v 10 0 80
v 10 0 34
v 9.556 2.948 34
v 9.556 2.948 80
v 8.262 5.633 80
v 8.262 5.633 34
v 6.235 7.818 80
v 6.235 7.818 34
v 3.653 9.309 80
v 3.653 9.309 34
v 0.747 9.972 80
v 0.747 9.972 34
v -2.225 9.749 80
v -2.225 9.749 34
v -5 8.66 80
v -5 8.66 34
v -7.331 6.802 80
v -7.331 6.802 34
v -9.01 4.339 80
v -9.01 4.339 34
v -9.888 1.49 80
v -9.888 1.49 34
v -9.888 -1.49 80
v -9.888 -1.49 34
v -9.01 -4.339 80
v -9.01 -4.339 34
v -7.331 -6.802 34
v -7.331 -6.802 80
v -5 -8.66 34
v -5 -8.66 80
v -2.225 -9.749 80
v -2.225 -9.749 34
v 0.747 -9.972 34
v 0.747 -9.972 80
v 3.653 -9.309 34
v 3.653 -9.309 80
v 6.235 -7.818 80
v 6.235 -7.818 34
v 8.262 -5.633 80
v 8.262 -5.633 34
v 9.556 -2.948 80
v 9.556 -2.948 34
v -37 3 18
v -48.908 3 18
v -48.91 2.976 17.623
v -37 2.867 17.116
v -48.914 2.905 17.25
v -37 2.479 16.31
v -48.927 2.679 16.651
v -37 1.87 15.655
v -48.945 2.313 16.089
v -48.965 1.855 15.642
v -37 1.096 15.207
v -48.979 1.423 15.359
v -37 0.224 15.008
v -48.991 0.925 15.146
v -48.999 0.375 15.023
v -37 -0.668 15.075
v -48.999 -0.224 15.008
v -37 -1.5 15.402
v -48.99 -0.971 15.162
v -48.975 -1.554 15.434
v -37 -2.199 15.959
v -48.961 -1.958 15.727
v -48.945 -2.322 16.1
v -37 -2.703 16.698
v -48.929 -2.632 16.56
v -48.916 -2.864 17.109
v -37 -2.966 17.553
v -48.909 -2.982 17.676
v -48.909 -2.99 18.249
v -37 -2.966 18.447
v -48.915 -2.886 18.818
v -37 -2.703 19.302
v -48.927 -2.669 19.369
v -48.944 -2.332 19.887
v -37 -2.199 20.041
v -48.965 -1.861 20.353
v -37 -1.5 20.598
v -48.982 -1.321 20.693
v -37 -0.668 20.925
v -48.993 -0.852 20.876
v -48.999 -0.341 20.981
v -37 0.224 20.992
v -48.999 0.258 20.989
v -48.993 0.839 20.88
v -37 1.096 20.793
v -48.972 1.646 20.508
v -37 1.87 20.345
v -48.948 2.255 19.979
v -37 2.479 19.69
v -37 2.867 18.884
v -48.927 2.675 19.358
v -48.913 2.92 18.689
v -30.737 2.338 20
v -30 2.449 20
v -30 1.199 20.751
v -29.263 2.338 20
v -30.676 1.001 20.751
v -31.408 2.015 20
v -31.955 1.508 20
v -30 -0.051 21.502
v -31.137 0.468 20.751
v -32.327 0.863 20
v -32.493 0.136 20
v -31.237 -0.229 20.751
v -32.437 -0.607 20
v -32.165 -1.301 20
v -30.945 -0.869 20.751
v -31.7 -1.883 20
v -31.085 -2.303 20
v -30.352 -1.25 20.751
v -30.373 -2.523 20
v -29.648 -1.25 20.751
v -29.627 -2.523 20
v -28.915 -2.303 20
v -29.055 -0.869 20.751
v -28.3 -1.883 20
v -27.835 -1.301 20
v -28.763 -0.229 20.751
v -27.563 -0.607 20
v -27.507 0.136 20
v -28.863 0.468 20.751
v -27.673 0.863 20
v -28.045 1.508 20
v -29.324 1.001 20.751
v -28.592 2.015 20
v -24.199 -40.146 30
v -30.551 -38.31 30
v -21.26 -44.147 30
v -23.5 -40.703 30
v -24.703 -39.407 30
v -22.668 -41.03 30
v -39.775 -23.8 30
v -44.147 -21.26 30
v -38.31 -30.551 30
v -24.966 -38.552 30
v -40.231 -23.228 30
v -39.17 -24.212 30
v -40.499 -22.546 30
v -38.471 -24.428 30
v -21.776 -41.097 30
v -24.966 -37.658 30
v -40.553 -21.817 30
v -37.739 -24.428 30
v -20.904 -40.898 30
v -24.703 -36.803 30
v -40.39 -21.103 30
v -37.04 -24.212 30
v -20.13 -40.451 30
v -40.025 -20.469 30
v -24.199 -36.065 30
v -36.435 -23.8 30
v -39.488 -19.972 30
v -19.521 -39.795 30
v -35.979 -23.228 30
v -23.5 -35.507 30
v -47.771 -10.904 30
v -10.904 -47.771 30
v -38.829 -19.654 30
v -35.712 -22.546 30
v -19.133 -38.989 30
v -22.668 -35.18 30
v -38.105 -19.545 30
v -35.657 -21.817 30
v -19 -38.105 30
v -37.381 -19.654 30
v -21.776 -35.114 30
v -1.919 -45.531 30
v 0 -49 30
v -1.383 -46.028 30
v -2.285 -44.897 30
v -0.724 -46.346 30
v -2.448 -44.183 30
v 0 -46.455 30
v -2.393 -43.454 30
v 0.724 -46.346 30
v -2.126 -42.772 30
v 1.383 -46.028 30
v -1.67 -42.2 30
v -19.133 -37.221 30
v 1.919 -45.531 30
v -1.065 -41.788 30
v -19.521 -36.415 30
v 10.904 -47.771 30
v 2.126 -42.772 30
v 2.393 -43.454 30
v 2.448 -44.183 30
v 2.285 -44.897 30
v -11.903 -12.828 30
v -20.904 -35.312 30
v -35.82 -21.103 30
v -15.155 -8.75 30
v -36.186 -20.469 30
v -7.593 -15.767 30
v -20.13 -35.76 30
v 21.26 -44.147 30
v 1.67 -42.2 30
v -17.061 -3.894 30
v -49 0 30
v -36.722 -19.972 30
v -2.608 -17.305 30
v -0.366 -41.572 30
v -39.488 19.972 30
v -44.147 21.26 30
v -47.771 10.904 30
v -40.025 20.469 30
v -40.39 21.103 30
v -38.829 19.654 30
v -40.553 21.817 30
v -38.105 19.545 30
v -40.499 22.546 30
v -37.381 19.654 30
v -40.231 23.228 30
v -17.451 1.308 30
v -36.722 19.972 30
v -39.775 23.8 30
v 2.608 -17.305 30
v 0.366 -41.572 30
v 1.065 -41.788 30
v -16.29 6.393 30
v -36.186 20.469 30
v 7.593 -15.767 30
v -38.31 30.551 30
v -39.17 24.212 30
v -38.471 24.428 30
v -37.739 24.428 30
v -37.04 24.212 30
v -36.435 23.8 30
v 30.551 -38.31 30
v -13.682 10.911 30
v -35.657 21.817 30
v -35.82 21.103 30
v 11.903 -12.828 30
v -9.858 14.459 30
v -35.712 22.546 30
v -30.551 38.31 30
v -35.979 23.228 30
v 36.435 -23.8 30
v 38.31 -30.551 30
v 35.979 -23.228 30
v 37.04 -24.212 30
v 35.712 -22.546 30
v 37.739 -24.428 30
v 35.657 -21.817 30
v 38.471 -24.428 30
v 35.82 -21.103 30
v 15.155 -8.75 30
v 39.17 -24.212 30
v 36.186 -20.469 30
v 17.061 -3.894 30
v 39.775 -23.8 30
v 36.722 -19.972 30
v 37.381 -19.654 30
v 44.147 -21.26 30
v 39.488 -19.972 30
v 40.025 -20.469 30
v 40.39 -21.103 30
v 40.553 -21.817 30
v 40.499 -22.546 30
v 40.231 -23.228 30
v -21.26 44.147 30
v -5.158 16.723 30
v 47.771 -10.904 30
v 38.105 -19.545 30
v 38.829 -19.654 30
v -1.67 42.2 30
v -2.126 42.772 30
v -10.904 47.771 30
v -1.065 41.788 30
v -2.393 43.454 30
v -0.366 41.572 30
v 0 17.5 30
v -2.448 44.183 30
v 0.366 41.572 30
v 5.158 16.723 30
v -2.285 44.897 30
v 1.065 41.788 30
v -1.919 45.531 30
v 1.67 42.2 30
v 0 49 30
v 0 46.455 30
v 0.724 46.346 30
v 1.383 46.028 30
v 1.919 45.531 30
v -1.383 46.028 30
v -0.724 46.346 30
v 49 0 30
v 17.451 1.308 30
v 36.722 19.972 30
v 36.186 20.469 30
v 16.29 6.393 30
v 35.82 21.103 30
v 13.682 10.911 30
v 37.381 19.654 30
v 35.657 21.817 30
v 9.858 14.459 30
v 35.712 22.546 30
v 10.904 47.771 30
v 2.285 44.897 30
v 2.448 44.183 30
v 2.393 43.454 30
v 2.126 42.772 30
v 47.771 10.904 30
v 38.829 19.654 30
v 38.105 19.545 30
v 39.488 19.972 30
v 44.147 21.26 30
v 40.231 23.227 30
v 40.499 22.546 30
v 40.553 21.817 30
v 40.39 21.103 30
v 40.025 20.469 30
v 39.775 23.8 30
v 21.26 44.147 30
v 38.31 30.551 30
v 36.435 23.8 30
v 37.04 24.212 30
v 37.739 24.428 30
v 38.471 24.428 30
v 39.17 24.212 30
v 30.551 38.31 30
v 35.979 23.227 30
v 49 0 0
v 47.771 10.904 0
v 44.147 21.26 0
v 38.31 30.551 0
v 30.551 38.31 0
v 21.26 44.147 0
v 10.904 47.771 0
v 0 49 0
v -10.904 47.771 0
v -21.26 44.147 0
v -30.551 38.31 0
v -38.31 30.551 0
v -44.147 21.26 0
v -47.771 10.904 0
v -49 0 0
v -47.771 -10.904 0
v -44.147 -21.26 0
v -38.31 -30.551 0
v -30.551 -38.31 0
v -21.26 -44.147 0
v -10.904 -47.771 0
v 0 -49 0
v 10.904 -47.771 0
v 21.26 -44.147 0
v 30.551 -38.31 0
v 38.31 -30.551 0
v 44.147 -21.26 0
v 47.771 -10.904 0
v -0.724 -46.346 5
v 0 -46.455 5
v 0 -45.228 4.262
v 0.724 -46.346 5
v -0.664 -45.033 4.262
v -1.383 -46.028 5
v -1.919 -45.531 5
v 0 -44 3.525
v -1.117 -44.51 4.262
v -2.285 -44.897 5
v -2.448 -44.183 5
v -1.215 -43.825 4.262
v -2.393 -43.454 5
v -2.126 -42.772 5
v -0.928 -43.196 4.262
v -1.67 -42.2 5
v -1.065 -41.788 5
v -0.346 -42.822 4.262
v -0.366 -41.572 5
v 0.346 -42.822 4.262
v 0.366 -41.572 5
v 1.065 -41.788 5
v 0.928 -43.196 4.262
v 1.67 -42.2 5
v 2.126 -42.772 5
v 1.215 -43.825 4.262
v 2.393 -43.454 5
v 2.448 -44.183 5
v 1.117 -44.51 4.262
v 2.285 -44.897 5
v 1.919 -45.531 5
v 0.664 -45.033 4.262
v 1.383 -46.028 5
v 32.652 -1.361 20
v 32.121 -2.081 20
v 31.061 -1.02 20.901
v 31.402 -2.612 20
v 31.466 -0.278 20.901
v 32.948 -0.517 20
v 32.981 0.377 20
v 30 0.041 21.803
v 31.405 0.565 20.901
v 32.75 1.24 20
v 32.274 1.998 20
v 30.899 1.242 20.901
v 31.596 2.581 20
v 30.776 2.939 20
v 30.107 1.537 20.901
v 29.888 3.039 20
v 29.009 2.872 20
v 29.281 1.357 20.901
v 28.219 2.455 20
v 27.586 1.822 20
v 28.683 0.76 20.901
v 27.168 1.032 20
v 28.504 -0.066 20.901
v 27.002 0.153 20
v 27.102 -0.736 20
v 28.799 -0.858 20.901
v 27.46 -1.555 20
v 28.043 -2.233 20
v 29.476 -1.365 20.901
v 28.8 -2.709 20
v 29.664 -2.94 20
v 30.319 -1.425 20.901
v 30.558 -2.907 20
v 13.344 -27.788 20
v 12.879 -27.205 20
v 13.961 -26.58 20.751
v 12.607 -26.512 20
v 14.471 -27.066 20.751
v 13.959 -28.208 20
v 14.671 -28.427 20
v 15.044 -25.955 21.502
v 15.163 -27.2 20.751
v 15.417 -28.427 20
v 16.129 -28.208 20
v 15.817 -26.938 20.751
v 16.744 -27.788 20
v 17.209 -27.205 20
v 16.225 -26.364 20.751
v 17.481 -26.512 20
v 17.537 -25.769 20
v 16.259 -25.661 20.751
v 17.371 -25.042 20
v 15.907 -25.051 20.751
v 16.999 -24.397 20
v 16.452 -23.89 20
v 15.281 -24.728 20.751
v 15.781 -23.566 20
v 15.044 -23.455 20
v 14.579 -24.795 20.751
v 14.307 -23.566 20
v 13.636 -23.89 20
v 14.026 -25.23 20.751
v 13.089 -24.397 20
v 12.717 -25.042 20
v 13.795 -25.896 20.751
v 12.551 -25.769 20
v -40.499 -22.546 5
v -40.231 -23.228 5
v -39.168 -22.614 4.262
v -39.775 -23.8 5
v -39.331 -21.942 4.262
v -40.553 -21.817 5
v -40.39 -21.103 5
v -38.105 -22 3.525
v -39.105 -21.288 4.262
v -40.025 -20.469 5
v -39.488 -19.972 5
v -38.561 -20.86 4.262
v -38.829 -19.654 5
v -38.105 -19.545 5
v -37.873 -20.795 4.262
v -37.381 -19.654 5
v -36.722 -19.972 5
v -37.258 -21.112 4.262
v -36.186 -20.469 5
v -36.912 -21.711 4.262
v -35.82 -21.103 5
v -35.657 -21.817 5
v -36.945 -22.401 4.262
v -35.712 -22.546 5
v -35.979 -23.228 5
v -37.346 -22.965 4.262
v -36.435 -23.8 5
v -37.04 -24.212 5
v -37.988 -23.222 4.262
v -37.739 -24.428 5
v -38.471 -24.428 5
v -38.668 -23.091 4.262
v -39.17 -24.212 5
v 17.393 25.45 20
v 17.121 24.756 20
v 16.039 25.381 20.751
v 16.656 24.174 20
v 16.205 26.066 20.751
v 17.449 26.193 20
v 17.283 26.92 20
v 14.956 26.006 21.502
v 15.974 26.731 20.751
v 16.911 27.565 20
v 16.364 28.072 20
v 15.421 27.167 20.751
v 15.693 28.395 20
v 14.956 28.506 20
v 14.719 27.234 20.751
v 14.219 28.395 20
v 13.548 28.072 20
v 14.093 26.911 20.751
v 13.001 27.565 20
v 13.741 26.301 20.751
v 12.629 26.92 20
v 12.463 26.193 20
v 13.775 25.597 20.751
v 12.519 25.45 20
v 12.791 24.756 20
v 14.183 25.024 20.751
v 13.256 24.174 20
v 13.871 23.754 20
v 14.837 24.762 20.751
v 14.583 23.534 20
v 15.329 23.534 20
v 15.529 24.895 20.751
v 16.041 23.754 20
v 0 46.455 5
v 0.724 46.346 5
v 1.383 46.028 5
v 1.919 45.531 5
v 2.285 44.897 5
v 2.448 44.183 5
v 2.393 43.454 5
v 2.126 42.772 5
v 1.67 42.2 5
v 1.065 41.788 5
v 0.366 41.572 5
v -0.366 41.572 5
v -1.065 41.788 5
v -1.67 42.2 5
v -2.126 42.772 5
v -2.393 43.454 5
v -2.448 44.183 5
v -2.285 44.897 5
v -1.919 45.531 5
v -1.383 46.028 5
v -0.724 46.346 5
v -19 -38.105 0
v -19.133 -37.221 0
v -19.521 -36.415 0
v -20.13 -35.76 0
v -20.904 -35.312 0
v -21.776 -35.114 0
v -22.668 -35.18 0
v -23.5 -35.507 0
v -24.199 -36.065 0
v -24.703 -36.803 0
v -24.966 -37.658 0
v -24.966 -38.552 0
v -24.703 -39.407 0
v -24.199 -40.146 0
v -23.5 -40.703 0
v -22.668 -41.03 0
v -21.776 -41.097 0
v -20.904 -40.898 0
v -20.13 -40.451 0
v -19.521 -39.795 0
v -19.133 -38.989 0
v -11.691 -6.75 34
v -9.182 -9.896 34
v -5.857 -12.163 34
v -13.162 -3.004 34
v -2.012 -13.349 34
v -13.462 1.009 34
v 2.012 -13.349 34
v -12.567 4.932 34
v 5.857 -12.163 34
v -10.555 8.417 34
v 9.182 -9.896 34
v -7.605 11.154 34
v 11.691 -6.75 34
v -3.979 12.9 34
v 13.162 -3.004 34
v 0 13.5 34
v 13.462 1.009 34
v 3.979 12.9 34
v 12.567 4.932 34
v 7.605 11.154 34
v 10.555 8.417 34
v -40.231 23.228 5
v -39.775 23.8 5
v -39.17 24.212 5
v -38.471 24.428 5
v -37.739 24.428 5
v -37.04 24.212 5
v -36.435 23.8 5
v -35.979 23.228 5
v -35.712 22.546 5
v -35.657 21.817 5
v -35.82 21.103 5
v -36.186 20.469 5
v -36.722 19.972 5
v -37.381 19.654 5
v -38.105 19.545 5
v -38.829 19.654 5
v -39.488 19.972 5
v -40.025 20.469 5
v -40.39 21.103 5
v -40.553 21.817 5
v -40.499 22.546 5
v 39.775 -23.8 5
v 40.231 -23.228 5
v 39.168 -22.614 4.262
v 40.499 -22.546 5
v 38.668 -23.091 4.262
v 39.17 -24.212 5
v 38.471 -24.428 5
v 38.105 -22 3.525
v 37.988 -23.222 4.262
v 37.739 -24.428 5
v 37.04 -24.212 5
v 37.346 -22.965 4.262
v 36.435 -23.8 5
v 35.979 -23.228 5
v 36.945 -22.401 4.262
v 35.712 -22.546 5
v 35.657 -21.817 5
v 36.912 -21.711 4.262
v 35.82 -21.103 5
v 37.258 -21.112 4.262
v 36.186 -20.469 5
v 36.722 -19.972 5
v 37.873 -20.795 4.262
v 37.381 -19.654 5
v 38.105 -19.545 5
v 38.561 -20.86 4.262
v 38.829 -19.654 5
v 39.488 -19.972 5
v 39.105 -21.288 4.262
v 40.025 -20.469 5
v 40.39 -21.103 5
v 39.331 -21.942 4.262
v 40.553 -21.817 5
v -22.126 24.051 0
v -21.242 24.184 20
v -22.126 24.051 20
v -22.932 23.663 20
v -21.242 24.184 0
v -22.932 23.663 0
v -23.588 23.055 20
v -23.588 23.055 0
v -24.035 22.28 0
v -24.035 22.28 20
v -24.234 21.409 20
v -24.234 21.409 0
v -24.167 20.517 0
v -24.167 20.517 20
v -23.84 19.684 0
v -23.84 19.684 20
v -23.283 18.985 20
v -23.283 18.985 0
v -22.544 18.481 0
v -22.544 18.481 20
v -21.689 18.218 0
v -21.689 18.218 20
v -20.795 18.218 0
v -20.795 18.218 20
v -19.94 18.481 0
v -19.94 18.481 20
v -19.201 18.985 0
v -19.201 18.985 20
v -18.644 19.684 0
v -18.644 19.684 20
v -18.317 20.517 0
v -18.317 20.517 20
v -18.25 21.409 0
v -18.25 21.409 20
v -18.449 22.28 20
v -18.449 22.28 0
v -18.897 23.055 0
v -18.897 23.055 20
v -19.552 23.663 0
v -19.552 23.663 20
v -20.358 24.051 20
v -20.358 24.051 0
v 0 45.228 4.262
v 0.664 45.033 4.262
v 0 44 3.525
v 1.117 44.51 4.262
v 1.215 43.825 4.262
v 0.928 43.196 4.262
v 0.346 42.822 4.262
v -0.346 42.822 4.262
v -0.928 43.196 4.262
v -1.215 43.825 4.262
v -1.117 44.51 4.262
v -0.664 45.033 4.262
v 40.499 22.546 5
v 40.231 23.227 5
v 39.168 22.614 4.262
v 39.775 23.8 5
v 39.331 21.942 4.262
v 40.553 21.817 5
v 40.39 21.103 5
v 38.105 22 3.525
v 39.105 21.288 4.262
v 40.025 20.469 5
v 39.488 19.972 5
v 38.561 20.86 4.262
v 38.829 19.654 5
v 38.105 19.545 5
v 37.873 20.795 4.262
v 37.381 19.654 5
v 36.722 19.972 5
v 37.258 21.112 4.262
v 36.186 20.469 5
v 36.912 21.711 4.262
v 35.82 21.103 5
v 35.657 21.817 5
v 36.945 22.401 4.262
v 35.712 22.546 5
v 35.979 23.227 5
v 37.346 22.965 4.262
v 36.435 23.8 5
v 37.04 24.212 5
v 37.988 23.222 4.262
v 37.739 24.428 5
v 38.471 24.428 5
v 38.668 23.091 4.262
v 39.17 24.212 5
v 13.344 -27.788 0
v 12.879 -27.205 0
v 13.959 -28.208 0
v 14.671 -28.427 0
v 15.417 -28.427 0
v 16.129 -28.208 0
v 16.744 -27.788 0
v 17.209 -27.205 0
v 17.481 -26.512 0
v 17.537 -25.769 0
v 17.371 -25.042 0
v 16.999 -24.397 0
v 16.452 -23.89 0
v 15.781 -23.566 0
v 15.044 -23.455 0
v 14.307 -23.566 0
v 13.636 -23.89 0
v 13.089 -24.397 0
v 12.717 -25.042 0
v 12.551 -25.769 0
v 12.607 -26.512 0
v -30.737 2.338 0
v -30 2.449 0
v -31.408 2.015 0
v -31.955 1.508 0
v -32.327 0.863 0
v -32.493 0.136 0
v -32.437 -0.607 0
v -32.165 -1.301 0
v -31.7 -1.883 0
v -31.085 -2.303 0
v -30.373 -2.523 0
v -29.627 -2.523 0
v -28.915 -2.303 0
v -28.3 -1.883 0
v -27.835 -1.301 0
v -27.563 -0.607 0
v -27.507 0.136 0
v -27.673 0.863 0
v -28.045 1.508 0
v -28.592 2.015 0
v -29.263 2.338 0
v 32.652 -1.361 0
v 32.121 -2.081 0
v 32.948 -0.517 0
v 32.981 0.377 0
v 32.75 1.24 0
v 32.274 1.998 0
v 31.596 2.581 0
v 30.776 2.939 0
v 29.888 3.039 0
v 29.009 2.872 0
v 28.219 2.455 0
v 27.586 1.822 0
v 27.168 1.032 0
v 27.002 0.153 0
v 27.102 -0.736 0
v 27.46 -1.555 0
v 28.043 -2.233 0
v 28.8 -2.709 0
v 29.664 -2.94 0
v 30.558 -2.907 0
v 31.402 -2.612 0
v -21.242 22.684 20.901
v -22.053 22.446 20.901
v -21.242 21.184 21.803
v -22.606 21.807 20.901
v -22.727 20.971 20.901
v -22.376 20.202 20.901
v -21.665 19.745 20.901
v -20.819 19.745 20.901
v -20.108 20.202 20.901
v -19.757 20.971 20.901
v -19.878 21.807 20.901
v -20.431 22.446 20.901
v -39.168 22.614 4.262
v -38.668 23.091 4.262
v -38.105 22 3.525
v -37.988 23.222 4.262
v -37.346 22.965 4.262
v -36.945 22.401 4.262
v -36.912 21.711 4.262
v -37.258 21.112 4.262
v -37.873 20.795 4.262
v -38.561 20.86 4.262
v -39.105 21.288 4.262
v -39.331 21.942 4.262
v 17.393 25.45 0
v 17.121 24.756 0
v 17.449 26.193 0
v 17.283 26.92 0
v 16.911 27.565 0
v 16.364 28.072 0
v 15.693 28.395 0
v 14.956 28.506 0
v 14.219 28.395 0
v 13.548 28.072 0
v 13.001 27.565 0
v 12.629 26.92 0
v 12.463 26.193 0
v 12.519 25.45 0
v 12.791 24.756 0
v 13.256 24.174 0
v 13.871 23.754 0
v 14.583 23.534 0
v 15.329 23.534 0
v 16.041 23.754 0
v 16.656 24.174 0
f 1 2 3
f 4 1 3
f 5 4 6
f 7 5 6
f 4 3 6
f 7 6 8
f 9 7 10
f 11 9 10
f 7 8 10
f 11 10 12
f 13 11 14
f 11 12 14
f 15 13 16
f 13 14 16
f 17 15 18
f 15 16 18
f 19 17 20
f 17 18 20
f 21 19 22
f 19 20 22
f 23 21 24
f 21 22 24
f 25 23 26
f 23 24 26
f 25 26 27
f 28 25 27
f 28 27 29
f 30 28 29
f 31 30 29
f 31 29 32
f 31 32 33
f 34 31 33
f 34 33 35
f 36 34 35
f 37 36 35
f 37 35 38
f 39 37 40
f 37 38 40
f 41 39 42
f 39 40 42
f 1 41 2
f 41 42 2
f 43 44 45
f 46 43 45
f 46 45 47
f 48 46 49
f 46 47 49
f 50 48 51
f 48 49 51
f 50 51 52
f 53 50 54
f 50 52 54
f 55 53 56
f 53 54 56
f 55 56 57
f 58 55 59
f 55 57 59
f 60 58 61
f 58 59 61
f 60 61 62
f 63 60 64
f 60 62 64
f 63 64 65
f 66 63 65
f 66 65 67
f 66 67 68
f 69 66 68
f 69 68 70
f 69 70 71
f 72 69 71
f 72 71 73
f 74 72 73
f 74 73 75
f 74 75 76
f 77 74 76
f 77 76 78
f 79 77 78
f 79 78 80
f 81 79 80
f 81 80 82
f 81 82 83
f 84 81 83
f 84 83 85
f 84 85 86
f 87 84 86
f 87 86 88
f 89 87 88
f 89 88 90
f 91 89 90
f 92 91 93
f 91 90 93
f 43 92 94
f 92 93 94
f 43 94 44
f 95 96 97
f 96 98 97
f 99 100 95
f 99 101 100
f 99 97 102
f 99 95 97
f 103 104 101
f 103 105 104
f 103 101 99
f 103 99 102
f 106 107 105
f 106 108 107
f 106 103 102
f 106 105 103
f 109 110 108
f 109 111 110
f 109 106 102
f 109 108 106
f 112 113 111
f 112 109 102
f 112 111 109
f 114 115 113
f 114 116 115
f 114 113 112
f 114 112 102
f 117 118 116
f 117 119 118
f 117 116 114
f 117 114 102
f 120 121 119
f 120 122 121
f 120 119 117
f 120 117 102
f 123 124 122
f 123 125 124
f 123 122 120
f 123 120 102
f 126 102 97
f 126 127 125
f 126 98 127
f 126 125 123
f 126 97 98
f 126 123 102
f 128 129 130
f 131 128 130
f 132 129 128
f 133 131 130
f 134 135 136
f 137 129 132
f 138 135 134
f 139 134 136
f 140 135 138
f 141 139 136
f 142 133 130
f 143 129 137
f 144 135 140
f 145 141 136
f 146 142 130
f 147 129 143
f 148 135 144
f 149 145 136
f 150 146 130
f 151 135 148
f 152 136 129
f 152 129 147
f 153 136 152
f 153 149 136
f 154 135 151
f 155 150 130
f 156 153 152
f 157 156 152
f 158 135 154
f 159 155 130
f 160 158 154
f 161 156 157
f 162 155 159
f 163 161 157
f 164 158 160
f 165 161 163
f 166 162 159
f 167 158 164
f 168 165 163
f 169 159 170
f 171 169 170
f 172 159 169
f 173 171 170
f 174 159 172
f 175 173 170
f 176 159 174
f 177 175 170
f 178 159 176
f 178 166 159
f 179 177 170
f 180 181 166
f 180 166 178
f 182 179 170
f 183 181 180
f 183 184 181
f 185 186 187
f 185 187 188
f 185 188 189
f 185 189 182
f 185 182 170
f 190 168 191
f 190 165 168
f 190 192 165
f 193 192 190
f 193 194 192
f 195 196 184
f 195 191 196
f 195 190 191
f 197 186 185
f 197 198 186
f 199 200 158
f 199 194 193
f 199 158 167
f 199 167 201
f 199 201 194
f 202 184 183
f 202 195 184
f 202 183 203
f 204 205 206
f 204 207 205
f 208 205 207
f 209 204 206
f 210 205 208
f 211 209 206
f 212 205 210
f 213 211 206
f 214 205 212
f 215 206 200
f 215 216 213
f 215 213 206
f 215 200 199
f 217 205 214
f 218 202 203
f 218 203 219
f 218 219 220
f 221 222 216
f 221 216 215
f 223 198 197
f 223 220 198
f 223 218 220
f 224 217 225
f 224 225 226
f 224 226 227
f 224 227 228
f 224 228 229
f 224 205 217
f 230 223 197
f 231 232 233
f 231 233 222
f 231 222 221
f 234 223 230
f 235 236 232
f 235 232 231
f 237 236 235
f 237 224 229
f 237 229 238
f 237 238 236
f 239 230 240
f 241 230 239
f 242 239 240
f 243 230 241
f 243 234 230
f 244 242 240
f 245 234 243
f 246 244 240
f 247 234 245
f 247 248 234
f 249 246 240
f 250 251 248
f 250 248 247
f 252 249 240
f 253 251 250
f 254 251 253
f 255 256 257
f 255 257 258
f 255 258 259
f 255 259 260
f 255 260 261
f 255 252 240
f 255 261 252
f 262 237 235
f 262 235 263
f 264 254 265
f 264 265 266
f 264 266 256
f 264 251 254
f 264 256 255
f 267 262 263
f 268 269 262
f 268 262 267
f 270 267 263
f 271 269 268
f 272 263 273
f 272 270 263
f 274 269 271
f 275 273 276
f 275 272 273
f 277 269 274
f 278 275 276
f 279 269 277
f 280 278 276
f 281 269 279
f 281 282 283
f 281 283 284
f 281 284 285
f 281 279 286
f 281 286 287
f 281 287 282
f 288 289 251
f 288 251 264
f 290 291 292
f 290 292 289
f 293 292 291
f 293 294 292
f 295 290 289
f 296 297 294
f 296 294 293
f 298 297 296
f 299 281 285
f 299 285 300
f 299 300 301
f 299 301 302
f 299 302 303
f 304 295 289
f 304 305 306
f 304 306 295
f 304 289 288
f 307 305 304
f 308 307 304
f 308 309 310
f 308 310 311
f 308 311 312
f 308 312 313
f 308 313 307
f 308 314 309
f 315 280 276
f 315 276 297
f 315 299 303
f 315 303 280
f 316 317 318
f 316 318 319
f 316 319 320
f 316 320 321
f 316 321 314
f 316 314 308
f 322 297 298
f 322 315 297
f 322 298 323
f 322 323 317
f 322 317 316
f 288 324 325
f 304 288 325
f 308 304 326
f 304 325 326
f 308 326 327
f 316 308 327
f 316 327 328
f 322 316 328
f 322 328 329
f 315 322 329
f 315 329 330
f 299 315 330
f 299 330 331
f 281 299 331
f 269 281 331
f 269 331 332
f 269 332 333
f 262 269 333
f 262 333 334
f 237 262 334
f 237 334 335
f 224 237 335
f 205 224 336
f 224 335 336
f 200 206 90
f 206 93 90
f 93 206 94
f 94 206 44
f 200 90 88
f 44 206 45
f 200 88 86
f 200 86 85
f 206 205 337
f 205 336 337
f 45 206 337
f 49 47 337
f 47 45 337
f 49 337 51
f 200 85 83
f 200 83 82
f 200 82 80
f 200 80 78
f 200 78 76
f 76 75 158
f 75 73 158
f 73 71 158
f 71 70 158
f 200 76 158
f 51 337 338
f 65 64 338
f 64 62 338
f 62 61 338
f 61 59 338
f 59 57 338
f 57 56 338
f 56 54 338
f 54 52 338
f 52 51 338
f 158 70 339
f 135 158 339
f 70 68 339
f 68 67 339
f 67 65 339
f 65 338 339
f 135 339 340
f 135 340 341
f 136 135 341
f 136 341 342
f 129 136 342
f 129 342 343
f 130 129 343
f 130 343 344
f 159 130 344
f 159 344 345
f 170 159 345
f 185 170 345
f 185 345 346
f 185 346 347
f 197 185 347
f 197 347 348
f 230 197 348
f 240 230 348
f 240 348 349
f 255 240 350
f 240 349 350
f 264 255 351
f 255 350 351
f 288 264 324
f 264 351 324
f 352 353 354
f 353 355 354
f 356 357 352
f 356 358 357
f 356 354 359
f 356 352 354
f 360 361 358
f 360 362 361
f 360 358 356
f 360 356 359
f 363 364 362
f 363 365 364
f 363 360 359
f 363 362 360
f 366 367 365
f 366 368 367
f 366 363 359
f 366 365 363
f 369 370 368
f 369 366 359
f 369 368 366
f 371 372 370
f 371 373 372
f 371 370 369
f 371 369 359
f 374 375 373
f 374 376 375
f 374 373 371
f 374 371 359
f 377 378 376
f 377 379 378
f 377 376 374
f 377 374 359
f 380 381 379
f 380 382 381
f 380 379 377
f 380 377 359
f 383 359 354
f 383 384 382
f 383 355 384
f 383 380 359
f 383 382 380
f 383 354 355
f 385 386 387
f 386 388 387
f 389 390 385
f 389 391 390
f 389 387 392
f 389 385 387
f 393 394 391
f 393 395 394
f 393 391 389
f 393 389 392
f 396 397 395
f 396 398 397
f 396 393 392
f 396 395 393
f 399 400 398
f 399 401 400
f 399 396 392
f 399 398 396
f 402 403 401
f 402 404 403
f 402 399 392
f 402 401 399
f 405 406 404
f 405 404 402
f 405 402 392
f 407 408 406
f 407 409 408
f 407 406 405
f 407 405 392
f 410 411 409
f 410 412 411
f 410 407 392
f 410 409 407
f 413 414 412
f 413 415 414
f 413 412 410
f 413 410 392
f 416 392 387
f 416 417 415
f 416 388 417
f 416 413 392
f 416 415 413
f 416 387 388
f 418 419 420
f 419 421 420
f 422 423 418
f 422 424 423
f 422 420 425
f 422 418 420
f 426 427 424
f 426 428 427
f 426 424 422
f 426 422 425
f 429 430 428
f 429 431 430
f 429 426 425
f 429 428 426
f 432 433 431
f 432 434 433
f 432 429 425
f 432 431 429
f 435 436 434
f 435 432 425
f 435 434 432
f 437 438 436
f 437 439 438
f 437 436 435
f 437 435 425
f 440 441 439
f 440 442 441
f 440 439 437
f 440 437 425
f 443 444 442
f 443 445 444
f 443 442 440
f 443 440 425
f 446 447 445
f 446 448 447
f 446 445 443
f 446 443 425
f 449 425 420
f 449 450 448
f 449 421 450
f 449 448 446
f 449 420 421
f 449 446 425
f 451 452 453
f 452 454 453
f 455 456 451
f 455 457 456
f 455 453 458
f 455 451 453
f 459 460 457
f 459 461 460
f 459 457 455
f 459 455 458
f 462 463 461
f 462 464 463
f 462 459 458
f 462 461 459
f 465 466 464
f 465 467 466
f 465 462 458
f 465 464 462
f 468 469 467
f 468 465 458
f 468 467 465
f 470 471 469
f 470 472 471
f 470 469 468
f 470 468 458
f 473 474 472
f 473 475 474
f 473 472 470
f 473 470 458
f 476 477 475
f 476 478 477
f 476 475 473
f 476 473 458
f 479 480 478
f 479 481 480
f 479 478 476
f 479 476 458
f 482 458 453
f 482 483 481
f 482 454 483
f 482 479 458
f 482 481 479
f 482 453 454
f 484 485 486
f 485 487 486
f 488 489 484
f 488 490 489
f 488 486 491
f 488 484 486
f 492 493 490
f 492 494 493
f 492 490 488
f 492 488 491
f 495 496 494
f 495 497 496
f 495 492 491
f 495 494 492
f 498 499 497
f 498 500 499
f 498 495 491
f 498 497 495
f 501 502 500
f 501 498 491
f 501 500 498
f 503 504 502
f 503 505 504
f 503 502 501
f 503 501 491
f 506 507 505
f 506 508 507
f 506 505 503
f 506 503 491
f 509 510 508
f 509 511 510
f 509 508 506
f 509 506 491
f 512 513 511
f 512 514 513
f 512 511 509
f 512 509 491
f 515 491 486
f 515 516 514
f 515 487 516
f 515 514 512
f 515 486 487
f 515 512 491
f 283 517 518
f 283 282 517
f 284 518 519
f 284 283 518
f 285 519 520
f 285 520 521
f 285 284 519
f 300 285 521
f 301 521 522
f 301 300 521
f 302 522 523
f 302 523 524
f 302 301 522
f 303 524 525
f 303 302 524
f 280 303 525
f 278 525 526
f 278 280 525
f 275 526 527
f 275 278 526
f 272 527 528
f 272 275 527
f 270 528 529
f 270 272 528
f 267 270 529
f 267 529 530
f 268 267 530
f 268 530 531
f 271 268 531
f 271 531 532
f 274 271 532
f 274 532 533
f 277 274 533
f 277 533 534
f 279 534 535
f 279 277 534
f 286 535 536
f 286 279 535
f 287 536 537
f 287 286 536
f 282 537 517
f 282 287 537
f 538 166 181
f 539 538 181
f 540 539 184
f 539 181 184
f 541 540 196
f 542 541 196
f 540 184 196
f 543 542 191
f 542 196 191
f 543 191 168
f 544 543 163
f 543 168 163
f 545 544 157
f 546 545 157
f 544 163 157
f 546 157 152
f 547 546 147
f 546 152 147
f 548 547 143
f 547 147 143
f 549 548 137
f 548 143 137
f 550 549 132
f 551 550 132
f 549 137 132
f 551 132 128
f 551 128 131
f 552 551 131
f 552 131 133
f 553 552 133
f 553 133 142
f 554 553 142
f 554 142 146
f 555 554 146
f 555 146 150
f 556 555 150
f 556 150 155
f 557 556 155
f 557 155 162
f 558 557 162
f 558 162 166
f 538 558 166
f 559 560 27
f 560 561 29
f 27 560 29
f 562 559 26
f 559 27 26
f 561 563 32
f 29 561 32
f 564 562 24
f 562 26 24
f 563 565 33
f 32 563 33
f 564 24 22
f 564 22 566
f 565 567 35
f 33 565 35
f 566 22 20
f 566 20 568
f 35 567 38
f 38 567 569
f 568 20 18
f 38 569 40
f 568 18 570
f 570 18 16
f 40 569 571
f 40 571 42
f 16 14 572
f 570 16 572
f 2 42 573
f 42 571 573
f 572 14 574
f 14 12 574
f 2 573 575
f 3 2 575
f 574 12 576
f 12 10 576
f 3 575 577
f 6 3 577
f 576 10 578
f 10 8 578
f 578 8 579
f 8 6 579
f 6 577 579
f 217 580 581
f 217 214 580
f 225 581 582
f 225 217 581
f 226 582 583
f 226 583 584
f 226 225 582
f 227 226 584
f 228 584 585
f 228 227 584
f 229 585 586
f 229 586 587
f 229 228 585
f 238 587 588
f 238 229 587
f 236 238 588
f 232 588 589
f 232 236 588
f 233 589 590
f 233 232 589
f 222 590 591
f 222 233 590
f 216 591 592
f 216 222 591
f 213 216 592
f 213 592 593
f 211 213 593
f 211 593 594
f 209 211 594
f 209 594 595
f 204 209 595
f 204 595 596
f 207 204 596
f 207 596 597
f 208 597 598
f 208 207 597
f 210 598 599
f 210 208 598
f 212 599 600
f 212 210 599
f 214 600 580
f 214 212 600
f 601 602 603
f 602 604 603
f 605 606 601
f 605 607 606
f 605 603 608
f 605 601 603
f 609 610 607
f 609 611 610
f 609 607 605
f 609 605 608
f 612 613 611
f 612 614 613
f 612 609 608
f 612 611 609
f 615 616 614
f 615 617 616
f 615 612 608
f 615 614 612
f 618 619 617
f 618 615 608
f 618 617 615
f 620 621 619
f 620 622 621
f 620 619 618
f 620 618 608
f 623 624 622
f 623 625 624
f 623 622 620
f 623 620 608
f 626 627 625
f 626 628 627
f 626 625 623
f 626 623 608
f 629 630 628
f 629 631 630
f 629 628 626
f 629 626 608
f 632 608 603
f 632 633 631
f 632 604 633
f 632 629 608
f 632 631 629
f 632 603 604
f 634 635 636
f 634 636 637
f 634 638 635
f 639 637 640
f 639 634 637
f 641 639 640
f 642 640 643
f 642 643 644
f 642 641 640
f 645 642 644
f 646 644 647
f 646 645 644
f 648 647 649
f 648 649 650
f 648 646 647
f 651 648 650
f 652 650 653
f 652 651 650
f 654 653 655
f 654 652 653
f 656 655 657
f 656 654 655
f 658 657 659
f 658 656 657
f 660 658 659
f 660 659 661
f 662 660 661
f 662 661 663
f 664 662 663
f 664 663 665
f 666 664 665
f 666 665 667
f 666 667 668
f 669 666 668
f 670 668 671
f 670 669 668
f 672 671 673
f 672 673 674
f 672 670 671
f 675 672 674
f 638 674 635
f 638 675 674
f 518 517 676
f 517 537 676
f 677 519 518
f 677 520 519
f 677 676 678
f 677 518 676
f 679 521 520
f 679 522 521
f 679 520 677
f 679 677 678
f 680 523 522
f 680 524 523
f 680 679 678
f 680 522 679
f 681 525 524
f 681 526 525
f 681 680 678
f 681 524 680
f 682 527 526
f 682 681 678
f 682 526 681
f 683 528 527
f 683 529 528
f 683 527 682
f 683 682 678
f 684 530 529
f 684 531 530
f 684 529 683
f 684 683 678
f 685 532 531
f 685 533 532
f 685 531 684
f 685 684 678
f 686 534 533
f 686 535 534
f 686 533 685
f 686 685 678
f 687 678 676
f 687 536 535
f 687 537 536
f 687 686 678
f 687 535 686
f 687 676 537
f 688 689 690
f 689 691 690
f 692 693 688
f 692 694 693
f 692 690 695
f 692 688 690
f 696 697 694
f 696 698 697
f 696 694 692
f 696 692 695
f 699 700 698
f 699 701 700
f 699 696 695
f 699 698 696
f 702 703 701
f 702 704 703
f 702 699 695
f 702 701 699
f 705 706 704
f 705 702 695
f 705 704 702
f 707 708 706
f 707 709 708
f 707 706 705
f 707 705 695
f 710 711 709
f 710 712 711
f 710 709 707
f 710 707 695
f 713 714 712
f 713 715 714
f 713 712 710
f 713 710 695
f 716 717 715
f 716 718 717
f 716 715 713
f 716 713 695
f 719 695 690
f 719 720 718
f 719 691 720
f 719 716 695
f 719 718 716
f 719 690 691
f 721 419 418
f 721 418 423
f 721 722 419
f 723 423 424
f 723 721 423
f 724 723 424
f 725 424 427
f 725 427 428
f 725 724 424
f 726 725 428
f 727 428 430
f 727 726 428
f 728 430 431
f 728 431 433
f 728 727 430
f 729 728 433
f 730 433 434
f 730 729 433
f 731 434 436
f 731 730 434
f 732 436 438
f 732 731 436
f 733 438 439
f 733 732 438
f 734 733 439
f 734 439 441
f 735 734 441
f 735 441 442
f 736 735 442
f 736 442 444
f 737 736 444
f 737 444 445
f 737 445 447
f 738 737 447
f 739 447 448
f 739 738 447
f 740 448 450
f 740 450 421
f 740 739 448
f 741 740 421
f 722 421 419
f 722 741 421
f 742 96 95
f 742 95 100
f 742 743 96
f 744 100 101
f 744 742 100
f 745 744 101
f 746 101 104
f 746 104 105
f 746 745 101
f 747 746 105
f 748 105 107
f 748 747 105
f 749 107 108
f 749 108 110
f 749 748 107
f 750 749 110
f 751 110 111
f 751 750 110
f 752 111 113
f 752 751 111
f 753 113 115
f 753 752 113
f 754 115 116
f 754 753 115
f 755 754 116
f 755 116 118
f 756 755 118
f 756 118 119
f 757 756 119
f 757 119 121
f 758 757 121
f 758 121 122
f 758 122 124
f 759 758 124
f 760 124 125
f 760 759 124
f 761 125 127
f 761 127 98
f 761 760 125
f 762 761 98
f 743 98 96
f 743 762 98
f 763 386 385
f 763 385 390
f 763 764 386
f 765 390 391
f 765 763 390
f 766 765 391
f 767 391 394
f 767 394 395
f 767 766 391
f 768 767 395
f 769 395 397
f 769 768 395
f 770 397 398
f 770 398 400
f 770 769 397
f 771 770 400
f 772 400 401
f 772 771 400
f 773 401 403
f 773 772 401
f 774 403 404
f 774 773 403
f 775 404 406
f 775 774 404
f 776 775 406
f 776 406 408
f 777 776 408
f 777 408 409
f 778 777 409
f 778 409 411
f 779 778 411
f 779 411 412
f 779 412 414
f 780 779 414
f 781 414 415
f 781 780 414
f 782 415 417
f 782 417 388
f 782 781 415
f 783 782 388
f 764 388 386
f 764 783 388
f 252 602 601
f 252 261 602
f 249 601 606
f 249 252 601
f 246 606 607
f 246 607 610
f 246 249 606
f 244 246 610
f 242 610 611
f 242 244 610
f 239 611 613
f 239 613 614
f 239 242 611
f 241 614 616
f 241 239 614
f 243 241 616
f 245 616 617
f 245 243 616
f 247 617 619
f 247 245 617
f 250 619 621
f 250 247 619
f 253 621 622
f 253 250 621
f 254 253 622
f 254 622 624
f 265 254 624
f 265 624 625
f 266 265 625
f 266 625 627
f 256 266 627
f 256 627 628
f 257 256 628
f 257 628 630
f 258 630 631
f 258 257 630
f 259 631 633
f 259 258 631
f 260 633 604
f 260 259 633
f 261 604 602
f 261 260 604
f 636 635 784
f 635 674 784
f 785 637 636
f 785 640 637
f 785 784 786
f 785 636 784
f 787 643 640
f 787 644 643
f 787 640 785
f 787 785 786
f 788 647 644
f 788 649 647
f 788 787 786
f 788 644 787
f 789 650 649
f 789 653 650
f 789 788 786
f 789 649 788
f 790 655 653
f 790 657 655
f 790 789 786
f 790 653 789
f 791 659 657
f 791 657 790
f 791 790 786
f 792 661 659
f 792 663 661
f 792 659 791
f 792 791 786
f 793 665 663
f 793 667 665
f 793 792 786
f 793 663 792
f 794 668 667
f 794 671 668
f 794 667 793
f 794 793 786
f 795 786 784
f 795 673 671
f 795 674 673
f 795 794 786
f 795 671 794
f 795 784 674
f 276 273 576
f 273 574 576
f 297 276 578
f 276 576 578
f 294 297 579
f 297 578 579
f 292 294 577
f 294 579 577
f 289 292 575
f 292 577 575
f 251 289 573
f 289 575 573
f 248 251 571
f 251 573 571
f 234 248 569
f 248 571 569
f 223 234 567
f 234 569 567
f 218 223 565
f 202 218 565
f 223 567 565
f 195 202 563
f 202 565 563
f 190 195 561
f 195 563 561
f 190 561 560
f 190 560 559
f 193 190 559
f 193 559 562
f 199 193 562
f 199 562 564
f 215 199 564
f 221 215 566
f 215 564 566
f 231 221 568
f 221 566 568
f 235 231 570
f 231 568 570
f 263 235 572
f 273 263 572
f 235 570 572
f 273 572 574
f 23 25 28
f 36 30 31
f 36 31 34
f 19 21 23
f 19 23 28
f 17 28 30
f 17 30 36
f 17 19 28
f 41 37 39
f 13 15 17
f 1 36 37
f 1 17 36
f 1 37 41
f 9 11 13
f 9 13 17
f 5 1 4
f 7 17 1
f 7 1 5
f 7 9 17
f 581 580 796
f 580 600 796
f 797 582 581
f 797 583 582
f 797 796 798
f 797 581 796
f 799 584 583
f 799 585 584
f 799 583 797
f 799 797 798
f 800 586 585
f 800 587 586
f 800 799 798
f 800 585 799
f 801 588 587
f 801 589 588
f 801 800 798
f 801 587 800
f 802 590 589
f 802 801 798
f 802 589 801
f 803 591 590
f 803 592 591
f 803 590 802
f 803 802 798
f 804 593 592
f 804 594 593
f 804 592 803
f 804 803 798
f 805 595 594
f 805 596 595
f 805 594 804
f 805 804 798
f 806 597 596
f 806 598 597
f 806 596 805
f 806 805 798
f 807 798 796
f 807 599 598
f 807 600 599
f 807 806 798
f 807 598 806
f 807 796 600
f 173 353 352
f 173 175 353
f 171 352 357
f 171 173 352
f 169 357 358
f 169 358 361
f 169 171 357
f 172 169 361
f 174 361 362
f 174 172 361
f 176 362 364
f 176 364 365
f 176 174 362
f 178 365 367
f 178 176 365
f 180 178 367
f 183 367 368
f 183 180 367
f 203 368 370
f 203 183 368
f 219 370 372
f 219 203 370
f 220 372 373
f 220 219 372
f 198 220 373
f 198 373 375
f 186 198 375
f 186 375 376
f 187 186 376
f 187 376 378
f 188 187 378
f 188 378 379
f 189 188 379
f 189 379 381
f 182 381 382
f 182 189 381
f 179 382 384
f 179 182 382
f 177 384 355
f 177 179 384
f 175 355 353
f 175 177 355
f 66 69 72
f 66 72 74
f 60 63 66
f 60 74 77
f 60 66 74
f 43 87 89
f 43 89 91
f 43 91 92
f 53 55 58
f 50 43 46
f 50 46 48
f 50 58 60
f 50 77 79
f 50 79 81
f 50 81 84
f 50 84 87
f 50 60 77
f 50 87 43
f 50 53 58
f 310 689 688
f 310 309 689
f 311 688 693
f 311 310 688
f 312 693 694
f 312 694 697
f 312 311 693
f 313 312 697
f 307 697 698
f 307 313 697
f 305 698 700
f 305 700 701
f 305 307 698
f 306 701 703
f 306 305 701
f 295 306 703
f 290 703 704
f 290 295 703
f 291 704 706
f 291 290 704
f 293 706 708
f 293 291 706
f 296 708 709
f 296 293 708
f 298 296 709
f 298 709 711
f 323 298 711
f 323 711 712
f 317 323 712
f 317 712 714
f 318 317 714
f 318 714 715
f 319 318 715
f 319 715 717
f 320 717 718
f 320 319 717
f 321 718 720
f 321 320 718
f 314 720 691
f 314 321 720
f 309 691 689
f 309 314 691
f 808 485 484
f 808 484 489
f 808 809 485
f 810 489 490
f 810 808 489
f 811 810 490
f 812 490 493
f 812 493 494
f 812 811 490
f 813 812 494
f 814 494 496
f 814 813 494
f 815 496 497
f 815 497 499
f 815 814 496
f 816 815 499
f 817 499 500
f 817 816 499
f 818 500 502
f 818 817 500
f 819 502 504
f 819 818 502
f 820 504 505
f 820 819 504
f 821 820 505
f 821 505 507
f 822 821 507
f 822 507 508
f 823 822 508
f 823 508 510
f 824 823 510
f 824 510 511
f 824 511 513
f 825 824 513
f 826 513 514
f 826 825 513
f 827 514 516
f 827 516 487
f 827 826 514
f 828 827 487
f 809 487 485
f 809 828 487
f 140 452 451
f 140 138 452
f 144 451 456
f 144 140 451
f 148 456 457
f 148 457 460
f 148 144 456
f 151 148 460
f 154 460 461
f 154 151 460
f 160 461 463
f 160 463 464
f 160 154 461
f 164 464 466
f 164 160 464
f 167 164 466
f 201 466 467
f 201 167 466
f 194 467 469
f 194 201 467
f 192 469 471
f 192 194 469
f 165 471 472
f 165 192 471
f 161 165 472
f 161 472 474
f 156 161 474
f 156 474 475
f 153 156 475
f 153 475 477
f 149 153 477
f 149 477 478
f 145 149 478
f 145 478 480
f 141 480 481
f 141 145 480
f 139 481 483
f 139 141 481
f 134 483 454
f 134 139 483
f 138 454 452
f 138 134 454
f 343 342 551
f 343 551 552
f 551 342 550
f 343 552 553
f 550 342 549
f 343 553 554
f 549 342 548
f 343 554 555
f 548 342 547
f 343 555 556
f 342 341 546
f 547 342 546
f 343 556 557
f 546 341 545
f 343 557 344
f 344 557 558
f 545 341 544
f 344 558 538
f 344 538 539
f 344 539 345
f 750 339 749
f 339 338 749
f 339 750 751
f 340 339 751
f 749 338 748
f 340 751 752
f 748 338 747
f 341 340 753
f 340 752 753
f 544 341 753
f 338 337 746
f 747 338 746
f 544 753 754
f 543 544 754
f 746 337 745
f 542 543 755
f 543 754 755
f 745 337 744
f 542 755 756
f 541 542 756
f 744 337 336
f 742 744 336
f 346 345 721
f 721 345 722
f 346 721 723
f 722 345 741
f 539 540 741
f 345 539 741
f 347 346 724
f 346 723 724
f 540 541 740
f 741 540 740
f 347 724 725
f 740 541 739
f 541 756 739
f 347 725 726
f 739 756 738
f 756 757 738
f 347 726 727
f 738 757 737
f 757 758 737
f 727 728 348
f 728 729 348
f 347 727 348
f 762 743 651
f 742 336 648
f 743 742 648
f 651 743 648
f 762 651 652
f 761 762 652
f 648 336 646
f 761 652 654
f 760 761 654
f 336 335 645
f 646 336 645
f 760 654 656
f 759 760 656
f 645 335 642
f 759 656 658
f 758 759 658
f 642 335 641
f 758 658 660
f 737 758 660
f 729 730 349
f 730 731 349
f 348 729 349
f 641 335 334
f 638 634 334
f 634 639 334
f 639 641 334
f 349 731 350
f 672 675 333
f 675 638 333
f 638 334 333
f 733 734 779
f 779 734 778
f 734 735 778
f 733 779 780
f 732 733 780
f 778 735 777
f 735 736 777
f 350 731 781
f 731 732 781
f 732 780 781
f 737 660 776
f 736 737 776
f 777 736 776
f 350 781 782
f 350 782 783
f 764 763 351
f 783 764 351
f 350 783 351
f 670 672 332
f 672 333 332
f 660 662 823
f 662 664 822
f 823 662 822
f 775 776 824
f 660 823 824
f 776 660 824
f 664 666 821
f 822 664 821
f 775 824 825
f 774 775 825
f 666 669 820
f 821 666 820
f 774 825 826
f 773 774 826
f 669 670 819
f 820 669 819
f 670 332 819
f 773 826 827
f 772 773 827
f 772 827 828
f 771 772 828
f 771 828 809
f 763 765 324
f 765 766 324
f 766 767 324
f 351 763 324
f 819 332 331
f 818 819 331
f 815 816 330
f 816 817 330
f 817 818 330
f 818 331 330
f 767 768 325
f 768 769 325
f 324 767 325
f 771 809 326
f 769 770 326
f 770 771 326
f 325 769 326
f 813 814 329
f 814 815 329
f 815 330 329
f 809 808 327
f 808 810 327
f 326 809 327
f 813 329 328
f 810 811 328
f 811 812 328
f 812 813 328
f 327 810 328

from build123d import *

# Parameters (mm, degrees)
ESQUISSE1_R                  = 49
BASE_EXTRUSION_DEPTH         = 30
ESQUISSE20_R                 = 3
ENL_V_MAT_EXTRU_4_DEPTH      = 12
ESQUISSE3_R                  = 10
BOSS_EXTRU_1_DEPTH           = 46
ESQUISSE11_R                 = 3
ENL_V_MAT_EXTRU_3_DEPTH      = 31.0000001
R_P_TITION_CIRCULAIRE1_COUNT = 6
R_P_TITION_CIRCULAIRE3_COUNT = 2
R_P_TITION_CIRCULAIRE3_ANGLE = 135
R_P_TITION_CIRCULAIRE4_COUNT = 3


with BuildPart() as part:
    # Esquisse1 → Base-Extrusion (new body)
    with BuildSketch(Plane.XY):
        Circle(ESQUISSE1_R)
    extrude(amount=BASE_EXTRUSION_DEPTH)

    # Esquisse2 → Boss.-Révol.1 (revolve)
    with BuildSketch(Plane(origin=(0, 0, 0), x_dir=(0, 0, -1), z_dir=(1, 0, 0))):
        Polygon((-30, 0), (-30, 17.5), (-34, 13.5), (-34, 0), align=None)
    revolve(axis=Axis((0, 0, 38.858858859), (0, 0, -1)))

    # Esquisse20 → Enlèv. mat.-Extru.4 (cut)
    with BuildSketch(Plane(origin=(-49, 0, 15), x_dir=(0, 1, 0), z_dir=(-1, 0, 0))):
        with Locations((0, -3)):
            Circle(ESQUISSE20_R)
    extrude(amount=-ENL_V_MAT_EXTRU_4_DEPTH, mode=Mode.SUBTRACT)

    # Esquisse3 → Boss.-Extru.1 (add)
    with BuildSketch(Plane.XY.offset(34)):
        Circle(ESQUISSE3_R)
    extrude(amount=BOSS_EXTRU_1_DEPTH)

    # Esquisse11 → Enlèv. mat.-Extru.3 (cut, through all)
    with BuildSketch(Plane.XY.offset(30)):
        with Locations((-22, -38.105117767)):
            Circle(ESQUISSE11_R)
    extrude(amount=-ENL_V_MAT_EXTRU_3_DEPTH, mode=Mode.SUBTRACT)

    # Esquisse12 → Perçage2 (revolve, cut)
    with BuildSketch(Plane(origin=(0, -44, 30), x_dir=(0, -1, 0), z_dir=(1, 0, 0))):
        Polygon((0, 0), (0, 26.47511282), (2.455, 25), (2.455, 0), align=None)
    per_age2 = revolve(axis=Axis((0, -44, 34.244199587), (0, 0, -1)), mode=Mode.SUBTRACT)

    # Répétition circulaire1: Perçage2 ×6 about axis
    r_p_tition_circulaire1_axis = Axis((0, 0, 0), (0, 0, 1))
    for i in range(1, R_P_TITION_CIRCULAIRE1_COUNT):
        add(per_age2.rotate(r_p_tition_circulaire1_axis, i * 360 / R_P_TITION_CIRCULAIRE1_COUNT), mode=Mode.SUBTRACT)

    # Esquisse16 → Perçage4 (revolve, cut)
    with BuildSketch(Plane(origin=(-21.242014496, 21.184353192, 0), x_dir=(0, 1, 0), z_dir=(1, 0, 0))):
        Polygon((0, 0), (0, 21.802581857), (3, 20), (3, 0), align=None)
    per_age4 = revolve(axis=Axis((-21.242014496, 21.184353192, -6.35), (0, 0, 1)), mode=Mode.SUBTRACT)

    # Répétition circulaire3: Perçage4 ×2 about axis
    r_p_tition_circulaire3_axis = Axis((0, 0, 0), (0, 0, -1))
    for i in range(1, R_P_TITION_CIRCULAIRE3_COUNT):
        add(per_age4.rotate(r_p_tition_circulaire3_axis, i * R_P_TITION_CIRCULAIRE3_ANGLE / (R_P_TITION_CIRCULAIRE3_COUNT - 1)), mode=Mode.SUBTRACT)

    # Esquisse18 → Perçage5 (revolve, cut)
    with BuildSketch(Plane(origin=(-30, -0.050785262, 0), x_dir=(0, 1, 0), z_dir=(1, 0, 0))):
        Polygon((0, 0), (0, 21.502151548), (2.5, 20), (2.5, 0), align=None)
    per_age5 = revolve(axis=Axis((-30, -0.050785262, -6.35), (0, 0, 1)), mode=Mode.SUBTRACT)

    # Répétition circulaire4: Perçage5 ×3 about axis
    r_p_tition_circulaire4_axis = Axis((0, 0, 0), (0, 0, 1))
    for i in range(1, R_P_TITION_CIRCULAIRE4_COUNT):
        add(per_age5.rotate(r_p_tition_circulaire4_axis, i * 360 / R_P_TITION_CIRCULAIRE4_COUNT), mode=Mode.SUBTRACT)


solid = part.part
